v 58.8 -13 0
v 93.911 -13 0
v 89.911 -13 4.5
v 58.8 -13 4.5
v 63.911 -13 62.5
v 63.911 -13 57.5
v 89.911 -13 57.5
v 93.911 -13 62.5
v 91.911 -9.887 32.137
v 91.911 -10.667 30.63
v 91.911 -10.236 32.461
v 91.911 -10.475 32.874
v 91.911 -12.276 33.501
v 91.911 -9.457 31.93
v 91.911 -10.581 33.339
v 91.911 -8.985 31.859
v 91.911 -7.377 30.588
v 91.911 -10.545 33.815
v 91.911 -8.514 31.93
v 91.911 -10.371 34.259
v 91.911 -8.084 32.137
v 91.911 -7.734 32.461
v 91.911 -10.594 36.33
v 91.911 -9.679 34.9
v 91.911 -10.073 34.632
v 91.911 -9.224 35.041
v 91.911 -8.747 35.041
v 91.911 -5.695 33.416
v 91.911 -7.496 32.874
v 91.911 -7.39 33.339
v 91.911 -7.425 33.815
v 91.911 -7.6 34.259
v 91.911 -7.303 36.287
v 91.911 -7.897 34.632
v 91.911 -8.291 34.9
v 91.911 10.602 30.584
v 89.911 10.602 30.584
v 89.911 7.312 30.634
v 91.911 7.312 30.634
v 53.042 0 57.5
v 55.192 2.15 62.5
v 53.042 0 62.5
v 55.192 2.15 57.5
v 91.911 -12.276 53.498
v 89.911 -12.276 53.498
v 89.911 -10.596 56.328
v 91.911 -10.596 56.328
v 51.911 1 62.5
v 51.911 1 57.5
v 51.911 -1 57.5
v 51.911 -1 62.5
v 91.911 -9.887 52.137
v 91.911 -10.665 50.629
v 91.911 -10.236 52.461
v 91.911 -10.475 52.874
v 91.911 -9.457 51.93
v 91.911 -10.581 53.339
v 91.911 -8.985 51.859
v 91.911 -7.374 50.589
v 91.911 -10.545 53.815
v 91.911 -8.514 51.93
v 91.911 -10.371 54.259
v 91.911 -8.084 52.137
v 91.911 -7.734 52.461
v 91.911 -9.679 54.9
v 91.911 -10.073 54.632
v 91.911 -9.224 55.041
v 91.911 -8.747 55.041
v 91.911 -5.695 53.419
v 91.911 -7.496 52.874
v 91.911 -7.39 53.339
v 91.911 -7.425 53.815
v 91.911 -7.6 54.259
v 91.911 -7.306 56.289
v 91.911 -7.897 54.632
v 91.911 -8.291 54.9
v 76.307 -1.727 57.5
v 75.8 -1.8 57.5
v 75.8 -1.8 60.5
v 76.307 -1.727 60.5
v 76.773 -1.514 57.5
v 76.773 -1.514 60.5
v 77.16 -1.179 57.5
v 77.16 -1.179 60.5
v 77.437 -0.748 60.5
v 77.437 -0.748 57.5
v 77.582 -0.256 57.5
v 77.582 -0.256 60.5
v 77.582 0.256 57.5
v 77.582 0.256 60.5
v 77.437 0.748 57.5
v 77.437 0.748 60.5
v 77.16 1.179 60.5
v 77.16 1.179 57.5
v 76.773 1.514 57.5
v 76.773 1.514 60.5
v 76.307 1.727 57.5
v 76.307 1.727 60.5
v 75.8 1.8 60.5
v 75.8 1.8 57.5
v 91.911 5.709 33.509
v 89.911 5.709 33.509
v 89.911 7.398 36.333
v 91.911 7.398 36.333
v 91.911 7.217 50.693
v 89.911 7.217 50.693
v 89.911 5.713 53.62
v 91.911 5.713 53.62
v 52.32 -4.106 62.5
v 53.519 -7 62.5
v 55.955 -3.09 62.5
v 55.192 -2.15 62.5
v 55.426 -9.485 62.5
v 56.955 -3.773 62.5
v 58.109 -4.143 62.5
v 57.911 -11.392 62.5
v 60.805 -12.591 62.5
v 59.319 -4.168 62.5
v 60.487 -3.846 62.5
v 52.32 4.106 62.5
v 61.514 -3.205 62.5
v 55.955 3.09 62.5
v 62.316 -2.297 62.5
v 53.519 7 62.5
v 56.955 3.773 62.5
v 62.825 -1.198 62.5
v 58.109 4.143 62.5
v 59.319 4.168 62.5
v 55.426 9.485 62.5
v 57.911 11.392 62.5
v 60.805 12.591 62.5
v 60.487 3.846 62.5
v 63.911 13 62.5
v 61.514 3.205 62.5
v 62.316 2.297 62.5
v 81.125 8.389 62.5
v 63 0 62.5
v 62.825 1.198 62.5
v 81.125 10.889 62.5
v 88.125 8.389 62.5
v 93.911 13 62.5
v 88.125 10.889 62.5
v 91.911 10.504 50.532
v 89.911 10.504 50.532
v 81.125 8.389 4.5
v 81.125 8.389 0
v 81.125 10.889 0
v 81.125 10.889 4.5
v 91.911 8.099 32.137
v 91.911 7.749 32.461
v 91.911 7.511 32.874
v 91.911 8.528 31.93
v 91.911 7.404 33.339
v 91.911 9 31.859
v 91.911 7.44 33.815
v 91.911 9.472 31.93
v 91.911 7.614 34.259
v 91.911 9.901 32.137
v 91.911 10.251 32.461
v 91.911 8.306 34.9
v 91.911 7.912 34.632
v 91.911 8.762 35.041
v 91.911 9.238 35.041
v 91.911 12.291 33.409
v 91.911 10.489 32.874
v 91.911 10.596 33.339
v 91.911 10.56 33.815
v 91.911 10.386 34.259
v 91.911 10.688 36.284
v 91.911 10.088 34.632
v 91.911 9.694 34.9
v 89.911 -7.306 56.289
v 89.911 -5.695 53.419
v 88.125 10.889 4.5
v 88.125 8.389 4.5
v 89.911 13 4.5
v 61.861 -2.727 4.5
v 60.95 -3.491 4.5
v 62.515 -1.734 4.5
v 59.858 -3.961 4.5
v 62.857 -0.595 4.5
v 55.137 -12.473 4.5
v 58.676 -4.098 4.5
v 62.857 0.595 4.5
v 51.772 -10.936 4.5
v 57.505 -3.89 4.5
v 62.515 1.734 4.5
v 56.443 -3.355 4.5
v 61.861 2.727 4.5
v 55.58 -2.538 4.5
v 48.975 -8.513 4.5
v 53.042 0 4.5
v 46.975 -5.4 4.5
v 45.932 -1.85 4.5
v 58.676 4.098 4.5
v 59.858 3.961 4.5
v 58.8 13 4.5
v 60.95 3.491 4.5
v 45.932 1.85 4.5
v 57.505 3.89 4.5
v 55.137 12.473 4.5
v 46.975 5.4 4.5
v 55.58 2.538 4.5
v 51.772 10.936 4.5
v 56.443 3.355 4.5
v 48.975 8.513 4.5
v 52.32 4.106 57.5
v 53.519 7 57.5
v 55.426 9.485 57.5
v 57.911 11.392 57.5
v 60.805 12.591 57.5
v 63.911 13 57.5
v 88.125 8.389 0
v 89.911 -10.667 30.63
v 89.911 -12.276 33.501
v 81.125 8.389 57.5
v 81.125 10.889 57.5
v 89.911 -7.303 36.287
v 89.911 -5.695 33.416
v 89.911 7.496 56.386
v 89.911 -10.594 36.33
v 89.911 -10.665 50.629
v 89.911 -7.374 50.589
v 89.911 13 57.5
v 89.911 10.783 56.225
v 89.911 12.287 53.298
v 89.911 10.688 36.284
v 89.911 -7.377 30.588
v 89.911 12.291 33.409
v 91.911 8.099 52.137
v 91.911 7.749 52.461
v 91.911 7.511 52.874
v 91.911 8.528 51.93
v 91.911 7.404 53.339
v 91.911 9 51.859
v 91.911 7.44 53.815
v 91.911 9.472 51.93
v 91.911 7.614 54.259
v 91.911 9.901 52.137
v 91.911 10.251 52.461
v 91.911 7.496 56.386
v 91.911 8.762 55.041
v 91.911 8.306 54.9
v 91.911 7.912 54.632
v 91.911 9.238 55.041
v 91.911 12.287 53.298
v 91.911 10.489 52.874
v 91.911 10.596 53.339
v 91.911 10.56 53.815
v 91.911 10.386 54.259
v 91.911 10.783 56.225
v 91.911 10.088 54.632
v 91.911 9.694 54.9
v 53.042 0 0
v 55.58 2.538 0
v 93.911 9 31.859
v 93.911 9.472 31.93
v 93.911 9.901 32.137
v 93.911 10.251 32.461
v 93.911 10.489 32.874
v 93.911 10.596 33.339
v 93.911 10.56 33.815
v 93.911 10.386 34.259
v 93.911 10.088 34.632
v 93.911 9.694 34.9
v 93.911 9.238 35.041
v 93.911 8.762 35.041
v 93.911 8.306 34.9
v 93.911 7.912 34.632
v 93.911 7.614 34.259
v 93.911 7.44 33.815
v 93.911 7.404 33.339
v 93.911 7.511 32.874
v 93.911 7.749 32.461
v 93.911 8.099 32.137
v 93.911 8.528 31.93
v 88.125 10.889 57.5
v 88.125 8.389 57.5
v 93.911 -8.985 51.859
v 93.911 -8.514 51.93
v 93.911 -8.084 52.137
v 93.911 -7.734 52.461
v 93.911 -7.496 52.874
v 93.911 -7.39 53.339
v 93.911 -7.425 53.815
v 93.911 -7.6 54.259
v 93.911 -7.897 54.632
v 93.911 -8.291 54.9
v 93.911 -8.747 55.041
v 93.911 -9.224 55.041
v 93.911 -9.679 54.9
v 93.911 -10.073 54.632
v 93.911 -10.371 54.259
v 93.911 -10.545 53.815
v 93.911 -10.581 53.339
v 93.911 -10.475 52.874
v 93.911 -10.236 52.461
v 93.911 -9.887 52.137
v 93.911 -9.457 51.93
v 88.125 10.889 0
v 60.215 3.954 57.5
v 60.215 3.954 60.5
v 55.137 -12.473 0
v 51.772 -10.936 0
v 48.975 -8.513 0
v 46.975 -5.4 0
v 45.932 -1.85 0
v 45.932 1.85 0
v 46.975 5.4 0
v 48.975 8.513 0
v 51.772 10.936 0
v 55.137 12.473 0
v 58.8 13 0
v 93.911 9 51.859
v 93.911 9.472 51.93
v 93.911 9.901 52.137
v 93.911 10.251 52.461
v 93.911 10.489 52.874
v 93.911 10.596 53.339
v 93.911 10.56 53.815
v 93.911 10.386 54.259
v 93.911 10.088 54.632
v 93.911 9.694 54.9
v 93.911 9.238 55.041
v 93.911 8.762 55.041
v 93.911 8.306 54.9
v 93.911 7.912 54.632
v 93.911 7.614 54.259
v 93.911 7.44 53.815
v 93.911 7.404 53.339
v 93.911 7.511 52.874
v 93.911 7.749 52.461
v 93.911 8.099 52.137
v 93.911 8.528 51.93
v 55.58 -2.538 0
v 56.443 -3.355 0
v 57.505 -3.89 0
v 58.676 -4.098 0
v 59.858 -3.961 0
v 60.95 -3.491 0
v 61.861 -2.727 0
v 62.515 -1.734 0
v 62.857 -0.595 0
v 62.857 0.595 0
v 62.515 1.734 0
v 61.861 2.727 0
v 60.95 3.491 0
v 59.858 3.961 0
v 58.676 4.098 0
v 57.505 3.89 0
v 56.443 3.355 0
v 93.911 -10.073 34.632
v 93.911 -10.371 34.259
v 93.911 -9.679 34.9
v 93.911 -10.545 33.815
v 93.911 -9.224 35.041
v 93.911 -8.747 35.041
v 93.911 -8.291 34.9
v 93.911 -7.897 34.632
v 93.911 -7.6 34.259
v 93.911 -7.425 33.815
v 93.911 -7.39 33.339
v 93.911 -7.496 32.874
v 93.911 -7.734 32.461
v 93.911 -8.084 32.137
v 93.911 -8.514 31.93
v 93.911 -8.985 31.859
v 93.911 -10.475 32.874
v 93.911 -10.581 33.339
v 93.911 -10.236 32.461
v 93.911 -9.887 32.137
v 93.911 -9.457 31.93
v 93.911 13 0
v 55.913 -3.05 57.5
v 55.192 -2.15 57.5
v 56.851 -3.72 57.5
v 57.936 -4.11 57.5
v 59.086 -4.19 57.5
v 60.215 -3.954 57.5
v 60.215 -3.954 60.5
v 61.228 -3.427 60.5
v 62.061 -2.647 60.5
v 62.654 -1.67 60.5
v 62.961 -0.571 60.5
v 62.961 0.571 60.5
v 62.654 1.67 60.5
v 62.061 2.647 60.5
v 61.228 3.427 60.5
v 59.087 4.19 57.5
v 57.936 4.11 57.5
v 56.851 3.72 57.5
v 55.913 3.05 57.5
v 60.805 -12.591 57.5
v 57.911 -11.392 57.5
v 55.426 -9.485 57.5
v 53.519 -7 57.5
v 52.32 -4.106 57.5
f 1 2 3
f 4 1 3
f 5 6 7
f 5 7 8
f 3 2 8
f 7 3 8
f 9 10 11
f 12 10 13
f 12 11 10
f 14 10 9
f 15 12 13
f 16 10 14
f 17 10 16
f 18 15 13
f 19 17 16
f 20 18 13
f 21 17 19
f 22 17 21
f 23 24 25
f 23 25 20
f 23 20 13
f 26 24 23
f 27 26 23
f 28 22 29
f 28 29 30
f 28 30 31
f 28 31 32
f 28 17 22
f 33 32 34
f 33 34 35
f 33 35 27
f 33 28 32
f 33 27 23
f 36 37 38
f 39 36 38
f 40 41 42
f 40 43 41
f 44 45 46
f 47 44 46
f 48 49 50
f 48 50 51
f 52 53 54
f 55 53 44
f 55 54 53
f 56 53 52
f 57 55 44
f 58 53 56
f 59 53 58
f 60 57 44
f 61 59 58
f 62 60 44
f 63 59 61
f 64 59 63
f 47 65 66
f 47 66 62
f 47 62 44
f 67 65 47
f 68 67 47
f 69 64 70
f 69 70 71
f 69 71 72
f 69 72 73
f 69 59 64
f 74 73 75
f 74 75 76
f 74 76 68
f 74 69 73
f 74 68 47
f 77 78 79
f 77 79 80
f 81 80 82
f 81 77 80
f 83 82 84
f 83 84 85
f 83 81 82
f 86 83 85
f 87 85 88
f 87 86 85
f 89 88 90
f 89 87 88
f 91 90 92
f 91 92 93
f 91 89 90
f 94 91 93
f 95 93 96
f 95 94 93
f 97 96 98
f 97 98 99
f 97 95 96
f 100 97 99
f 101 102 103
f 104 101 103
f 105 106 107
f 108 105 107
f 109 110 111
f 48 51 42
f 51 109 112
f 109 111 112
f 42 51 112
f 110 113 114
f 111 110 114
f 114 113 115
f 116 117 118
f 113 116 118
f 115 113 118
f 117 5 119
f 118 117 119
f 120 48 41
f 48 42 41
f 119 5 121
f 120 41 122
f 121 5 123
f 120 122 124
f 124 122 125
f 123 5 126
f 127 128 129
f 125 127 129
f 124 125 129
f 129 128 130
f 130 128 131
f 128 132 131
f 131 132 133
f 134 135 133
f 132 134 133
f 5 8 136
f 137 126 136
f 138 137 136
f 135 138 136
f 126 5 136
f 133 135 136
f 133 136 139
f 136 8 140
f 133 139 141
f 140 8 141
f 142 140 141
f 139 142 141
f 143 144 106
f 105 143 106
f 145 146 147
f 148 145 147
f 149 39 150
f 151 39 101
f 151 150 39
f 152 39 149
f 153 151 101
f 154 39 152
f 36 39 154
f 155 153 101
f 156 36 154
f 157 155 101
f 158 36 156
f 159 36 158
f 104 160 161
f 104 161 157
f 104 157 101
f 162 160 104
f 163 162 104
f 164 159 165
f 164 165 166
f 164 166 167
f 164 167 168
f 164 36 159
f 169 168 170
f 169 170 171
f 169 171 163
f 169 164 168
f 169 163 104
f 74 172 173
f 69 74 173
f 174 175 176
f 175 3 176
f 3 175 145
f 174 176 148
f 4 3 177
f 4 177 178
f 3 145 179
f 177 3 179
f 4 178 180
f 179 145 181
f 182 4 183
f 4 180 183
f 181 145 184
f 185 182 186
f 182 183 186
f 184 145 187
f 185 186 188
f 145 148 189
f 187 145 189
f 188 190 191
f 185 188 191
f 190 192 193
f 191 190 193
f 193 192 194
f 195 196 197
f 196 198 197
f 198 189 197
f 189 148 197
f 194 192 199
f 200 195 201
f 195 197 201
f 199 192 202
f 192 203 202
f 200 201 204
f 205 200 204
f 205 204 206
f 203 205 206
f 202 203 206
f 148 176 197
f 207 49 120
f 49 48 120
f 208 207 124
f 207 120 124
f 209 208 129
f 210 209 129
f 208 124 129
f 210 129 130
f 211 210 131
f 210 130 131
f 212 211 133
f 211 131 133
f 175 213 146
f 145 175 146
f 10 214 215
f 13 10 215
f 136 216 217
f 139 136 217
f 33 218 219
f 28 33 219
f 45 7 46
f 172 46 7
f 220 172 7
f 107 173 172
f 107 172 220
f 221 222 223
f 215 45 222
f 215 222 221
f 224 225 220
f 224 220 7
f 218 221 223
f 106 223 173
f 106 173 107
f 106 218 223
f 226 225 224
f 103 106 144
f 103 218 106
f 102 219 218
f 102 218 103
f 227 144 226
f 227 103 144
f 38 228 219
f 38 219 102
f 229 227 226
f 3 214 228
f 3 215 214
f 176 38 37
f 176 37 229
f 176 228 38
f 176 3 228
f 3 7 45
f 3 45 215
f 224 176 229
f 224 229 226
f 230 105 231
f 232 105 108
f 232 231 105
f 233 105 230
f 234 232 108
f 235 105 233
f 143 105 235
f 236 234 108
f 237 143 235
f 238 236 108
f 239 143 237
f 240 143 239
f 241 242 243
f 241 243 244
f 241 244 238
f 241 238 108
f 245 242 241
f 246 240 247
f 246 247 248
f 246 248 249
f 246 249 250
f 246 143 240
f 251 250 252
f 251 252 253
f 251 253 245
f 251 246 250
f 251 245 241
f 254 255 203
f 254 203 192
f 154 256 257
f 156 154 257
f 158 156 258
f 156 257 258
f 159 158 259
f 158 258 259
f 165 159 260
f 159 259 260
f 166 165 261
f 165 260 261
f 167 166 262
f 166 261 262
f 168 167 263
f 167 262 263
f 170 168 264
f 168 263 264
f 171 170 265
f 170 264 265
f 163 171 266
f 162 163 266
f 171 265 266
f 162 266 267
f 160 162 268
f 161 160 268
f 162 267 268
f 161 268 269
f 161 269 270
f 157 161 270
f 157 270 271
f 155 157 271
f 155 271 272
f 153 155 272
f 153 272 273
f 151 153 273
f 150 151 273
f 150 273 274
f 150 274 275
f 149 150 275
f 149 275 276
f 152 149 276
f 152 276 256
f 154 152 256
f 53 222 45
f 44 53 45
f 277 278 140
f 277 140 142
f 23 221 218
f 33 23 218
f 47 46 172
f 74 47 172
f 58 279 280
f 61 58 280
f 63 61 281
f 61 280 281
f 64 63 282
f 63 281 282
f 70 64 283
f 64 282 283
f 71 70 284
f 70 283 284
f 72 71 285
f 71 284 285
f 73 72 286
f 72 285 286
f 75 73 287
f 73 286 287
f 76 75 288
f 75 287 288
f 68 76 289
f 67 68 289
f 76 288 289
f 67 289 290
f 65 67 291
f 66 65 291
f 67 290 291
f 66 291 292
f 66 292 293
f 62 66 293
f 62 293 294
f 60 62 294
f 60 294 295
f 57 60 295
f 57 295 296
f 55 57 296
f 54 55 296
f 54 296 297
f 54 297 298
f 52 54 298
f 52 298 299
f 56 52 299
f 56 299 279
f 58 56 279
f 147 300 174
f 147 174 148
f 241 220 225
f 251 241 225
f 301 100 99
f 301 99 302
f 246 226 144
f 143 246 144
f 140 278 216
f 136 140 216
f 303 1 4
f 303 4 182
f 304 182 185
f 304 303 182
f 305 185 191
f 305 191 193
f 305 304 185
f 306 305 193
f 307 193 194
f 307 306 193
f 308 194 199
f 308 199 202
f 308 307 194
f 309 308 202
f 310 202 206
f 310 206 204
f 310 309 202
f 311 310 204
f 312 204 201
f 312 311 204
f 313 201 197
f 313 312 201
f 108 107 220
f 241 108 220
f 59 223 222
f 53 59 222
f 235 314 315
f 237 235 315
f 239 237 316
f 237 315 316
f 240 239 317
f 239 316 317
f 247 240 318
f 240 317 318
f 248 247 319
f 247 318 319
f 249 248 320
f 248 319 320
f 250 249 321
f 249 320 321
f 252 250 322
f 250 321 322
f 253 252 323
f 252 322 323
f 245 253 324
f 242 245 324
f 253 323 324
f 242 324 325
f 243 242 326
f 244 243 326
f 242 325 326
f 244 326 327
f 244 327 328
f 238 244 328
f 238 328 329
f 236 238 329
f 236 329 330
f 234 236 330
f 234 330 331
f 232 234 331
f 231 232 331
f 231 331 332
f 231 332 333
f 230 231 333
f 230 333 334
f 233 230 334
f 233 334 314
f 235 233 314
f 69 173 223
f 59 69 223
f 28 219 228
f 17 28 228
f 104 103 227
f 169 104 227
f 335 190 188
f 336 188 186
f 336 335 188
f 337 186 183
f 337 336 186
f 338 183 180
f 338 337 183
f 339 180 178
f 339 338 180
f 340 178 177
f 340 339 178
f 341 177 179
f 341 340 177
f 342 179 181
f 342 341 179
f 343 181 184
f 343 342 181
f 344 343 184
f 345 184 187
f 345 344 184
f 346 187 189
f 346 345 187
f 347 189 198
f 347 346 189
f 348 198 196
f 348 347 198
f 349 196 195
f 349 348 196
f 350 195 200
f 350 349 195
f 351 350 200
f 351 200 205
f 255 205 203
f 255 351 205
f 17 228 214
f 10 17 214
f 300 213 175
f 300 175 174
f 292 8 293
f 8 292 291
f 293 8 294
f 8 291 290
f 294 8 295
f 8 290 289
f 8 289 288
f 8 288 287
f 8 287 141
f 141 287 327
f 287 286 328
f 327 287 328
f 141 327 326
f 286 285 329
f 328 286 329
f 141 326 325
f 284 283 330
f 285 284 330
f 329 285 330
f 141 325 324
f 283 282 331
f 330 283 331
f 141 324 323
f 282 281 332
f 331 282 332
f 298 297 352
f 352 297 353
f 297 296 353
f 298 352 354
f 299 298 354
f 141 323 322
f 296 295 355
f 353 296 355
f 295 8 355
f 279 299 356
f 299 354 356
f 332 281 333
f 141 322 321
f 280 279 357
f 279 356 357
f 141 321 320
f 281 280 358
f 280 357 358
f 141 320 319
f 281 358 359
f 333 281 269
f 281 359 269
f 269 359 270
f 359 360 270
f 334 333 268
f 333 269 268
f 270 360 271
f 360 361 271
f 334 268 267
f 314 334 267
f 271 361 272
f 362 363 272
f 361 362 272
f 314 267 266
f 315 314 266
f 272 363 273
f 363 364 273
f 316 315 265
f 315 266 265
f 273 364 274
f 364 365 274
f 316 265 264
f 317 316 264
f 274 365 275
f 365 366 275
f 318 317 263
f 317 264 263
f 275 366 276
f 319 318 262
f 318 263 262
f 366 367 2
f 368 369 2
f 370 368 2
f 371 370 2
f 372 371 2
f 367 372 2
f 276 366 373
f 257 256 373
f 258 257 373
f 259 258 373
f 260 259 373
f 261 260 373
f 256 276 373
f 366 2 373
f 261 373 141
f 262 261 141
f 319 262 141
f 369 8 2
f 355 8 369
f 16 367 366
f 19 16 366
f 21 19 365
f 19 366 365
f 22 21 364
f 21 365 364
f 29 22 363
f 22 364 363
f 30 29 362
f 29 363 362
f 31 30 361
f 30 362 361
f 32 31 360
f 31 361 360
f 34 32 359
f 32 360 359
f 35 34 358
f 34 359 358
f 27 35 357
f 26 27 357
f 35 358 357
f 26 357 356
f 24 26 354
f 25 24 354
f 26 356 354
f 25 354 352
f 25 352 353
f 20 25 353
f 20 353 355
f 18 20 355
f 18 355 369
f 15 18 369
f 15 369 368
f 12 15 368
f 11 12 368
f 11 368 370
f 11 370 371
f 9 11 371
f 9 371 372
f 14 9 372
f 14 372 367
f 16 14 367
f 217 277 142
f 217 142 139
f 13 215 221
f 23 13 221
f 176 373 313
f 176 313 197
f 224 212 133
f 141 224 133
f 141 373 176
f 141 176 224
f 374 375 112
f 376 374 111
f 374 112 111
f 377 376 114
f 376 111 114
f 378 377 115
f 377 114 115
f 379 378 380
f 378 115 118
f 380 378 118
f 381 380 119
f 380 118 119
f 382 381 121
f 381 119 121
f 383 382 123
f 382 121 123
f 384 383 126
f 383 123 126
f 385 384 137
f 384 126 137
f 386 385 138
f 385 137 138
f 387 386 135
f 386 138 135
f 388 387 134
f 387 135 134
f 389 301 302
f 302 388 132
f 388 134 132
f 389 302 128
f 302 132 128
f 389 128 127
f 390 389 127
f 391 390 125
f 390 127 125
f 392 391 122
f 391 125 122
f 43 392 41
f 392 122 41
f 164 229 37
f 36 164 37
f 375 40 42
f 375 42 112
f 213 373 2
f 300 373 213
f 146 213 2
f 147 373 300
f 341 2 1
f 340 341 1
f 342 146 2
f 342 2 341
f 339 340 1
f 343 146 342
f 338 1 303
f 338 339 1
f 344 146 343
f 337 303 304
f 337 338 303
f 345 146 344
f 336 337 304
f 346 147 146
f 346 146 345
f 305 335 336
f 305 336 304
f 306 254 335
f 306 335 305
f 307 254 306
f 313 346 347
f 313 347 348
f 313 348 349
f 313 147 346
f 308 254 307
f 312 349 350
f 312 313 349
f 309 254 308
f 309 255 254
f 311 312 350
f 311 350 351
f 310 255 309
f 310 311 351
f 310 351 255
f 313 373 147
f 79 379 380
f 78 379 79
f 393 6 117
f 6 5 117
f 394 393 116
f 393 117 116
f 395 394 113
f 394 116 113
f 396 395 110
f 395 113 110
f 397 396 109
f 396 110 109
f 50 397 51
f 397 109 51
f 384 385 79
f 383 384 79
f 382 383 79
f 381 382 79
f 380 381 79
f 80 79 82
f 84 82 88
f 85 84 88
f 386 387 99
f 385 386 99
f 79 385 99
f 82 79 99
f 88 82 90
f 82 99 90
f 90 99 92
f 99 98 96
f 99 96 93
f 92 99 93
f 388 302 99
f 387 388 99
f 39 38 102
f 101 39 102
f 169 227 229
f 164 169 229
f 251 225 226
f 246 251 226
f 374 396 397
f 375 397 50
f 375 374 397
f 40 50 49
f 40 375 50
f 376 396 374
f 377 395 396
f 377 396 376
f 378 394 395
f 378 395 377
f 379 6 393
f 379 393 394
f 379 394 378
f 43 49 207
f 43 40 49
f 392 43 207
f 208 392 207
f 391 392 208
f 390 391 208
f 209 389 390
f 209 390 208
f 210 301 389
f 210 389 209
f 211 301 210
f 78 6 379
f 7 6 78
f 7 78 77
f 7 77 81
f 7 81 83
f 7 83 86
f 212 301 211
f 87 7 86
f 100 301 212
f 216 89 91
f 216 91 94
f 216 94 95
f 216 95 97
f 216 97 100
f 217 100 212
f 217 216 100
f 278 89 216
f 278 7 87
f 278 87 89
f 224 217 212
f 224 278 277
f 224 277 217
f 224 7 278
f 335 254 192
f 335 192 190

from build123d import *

# Parameters (mm, degrees)
SKETCH1_R           = 4.1
BOSS_EXTRUDE1_DEPTH = 4.5
SKETCH2_W           = 4
SKETCH2_H           = 26
BOSS_EXTRUDE2_DEPTH = 58
SKETCH3_W           = 5
SKETCH3_H           = 26
BOSS_EXTRUDE3_DEPTH = 38
CUT_EXTRUDE1_START  = -5
CUT_EXTRUDE1_DEPTH  = 3
SKETCH6_R           = 4.2
CUT_EXTRUDE2_DEPTH  = 10
FILLET1_R           = 12
CUT_EXTRUDE4_DEPTH  = 74
SKETCH8_R           = 1.599994812
SKETCH8_R_2         = 1.6
SKETCH8_R_3         = 1.599991008
CUT_EXTRUDE5_DEPTH  = 8.5
CUT_EXTRUDE6_DEPTH  = 2
SKETCH10_W          = 7
SKETCH10_H          = 2.5
CUT_EXTRUDE7_DEPTH  = 114


with BuildPart() as part:
    # Sketch1 → Boss-Extrude1 (new body)
    with BuildSketch(Plane.XY):
        with BuildLine():
            Line((58.8, 13), (93.910980652, 13))
            Line((93.910980652, 13), (93.910980652, -13))
            Line((93.910980652, -13), (58.8, -13))
            ThreePointArc((58.8, -13), (45.8, 0), (58.8, 13))
        make_face()
        with Locations((58.8, 0)):
            Circle(SKETCH1_R, mode=Mode.SUBTRACT)
    extrude(amount=BOSS_EXTRUDE1_DEPTH)

    # Sketch2 → Boss-Extrude2 (add)
    with BuildSketch(Plane.XY.offset(4.5)):
        with Locations((91.910980652, 0)):
            Rectangle(SKETCH2_W, SKETCH2_H)
    extrude(amount=BOSS_EXTRUDE2_DEPTH)

    # Sketch3 → Boss-Extrude3 (add)
    with BuildSketch(Plane.ZY.offset(-89.910980652)):
        with Locations((60, 0)):
            Rectangle(SKETCH3_W, SKETCH3_H)
    extrude(amount=BOSS_EXTRUDE3_DEPTH)

    # Sketch5 → Cut-Extrude1 (cut)
    with BuildSketch(Plane.XY.offset(62.5).offset(CUT_EXTRUDE1_START)):
        with BuildLine():
            Line((75.8, 1.8), (59.925839282, 3.994369276))
            ThreePointArc((59.925839282, 3.994369276), (54.65, 6.2252e-05), (59.925719446, -3.99440305))
            Line((59.925719446, -3.99440305), (75.8, -1.799997977))
            ThreePointArc((75.8, -1.799997977), (77.599998989, 1.011e-06), (75.8, 1.8))
        make_face()
    extrude(amount=CUT_EXTRUDE1_DEPTH, mode=Mode.SUBTRACT)

    # Sketch6 → Cut-Extrude2 (cut)
    with BuildSketch(Plane.XY.offset(62.5)):
        with Locations((58.8, 0)):
            Circle(SKETCH6_R)
    extrude(amount=-CUT_EXTRUDE2_DEPTH, mode=Mode.SUBTRACT)

    # Fillet1
    fillet1_edges = [part.edges().sort_by_distance(p)[0] for p in [
        (51.910980652, 13, 60),
        (51.910980652, -13, 60),
    ]]
    fillet(fillet1_edges, radius=FILLET1_R)

    # Sketch7 → Cut-Extrude4 (cut)
    with BuildSketch(Plane(origin=(0, 0, 0), x_dir=(-1, 0, 0), z_dir=(0, 0, -1))):
        Polygon((-56.262443614, -3.220373827), (-56.262443614, 3.220373827), (-53.042069787, 0), align=None)
    extrude(amount=-CUT_EXTRUDE4_DEPTH, mode=Mode.SUBTRACT)

    # Sketch8 → Cut-Extrude5 (cut)
    with BuildSketch(Plane(origin=(93.910980652, 0, 0), x_dir=(0, 0, -1), z_dir=(1, 0, 0))):
        with Locations((-53.458782271, -8.985219923)):
            Circle(SKETCH8_R)
        with Locations((-53.458782271, 9)):
            Circle(SKETCH8_R_2)
        with Locations((-33.458782271, 9)):
            Circle(SKETCH8_R_2)
        with Locations((-33.458782271, -8.985219923)):
            Circle(SKETCH8_R_3)
    extrude(amount=-CUT_EXTRUDE5_DEPTH, mode=Mode.SUBTRACT)

    # Sketch9 → Cut-Extrude6 (cut)
    with BuildSketch(Plane.ZY.offset(-89.910980652)):
        Polygon((30.587828745, -7.37661001), (30.630208458, -10.667233653), (33.501161984, -12.275843566), (36.329735796, -10.593829837), (36.287356083, -7.303206194), (33.416402558, -5.69459628), align=None)
        Polygon((30.584160019, 10.602044603), (30.63405982, 7.311526406), (33.508682072, 5.709481802), (36.333404522, 7.397955397), (36.283504721, 10.688473594), (33.408882469, 12.290518198), align=None)
        Polygon((50.589182836, -7.374195689), (50.62879464, -10.664853815), (53.498394075, -12.27587805), (56.328381705, -10.596244158), (56.288769901, -7.305586031), (53.419170466, -5.694561797), align=None)
        Polygon((50.692796157, 7.216934993), (53.619968806, 5.713053256), (56.38595492, 7.496118262), (56.224768384, 10.783065007), (53.297595735, 12.286946744), (50.531609621, 10.503881738), align=None)
    extrude(amount=-CUT_EXTRUDE6_DEPTH, mode=Mode.SUBTRACT)

    # Sketch10 → Cut-Extrude7 (cut)
    with BuildSketch(Plane(origin=(0, 0, 0), x_dir=(-1, 0, 0), z_dir=(0, 0, -1))):
        with Locations((-84.62488512, 9.639193317)):
            Rectangle(SKETCH10_W, SKETCH10_H)
    extrude(amount=-CUT_EXTRUDE7_DEPTH, mode=Mode.SUBTRACT)


solid = part.part
